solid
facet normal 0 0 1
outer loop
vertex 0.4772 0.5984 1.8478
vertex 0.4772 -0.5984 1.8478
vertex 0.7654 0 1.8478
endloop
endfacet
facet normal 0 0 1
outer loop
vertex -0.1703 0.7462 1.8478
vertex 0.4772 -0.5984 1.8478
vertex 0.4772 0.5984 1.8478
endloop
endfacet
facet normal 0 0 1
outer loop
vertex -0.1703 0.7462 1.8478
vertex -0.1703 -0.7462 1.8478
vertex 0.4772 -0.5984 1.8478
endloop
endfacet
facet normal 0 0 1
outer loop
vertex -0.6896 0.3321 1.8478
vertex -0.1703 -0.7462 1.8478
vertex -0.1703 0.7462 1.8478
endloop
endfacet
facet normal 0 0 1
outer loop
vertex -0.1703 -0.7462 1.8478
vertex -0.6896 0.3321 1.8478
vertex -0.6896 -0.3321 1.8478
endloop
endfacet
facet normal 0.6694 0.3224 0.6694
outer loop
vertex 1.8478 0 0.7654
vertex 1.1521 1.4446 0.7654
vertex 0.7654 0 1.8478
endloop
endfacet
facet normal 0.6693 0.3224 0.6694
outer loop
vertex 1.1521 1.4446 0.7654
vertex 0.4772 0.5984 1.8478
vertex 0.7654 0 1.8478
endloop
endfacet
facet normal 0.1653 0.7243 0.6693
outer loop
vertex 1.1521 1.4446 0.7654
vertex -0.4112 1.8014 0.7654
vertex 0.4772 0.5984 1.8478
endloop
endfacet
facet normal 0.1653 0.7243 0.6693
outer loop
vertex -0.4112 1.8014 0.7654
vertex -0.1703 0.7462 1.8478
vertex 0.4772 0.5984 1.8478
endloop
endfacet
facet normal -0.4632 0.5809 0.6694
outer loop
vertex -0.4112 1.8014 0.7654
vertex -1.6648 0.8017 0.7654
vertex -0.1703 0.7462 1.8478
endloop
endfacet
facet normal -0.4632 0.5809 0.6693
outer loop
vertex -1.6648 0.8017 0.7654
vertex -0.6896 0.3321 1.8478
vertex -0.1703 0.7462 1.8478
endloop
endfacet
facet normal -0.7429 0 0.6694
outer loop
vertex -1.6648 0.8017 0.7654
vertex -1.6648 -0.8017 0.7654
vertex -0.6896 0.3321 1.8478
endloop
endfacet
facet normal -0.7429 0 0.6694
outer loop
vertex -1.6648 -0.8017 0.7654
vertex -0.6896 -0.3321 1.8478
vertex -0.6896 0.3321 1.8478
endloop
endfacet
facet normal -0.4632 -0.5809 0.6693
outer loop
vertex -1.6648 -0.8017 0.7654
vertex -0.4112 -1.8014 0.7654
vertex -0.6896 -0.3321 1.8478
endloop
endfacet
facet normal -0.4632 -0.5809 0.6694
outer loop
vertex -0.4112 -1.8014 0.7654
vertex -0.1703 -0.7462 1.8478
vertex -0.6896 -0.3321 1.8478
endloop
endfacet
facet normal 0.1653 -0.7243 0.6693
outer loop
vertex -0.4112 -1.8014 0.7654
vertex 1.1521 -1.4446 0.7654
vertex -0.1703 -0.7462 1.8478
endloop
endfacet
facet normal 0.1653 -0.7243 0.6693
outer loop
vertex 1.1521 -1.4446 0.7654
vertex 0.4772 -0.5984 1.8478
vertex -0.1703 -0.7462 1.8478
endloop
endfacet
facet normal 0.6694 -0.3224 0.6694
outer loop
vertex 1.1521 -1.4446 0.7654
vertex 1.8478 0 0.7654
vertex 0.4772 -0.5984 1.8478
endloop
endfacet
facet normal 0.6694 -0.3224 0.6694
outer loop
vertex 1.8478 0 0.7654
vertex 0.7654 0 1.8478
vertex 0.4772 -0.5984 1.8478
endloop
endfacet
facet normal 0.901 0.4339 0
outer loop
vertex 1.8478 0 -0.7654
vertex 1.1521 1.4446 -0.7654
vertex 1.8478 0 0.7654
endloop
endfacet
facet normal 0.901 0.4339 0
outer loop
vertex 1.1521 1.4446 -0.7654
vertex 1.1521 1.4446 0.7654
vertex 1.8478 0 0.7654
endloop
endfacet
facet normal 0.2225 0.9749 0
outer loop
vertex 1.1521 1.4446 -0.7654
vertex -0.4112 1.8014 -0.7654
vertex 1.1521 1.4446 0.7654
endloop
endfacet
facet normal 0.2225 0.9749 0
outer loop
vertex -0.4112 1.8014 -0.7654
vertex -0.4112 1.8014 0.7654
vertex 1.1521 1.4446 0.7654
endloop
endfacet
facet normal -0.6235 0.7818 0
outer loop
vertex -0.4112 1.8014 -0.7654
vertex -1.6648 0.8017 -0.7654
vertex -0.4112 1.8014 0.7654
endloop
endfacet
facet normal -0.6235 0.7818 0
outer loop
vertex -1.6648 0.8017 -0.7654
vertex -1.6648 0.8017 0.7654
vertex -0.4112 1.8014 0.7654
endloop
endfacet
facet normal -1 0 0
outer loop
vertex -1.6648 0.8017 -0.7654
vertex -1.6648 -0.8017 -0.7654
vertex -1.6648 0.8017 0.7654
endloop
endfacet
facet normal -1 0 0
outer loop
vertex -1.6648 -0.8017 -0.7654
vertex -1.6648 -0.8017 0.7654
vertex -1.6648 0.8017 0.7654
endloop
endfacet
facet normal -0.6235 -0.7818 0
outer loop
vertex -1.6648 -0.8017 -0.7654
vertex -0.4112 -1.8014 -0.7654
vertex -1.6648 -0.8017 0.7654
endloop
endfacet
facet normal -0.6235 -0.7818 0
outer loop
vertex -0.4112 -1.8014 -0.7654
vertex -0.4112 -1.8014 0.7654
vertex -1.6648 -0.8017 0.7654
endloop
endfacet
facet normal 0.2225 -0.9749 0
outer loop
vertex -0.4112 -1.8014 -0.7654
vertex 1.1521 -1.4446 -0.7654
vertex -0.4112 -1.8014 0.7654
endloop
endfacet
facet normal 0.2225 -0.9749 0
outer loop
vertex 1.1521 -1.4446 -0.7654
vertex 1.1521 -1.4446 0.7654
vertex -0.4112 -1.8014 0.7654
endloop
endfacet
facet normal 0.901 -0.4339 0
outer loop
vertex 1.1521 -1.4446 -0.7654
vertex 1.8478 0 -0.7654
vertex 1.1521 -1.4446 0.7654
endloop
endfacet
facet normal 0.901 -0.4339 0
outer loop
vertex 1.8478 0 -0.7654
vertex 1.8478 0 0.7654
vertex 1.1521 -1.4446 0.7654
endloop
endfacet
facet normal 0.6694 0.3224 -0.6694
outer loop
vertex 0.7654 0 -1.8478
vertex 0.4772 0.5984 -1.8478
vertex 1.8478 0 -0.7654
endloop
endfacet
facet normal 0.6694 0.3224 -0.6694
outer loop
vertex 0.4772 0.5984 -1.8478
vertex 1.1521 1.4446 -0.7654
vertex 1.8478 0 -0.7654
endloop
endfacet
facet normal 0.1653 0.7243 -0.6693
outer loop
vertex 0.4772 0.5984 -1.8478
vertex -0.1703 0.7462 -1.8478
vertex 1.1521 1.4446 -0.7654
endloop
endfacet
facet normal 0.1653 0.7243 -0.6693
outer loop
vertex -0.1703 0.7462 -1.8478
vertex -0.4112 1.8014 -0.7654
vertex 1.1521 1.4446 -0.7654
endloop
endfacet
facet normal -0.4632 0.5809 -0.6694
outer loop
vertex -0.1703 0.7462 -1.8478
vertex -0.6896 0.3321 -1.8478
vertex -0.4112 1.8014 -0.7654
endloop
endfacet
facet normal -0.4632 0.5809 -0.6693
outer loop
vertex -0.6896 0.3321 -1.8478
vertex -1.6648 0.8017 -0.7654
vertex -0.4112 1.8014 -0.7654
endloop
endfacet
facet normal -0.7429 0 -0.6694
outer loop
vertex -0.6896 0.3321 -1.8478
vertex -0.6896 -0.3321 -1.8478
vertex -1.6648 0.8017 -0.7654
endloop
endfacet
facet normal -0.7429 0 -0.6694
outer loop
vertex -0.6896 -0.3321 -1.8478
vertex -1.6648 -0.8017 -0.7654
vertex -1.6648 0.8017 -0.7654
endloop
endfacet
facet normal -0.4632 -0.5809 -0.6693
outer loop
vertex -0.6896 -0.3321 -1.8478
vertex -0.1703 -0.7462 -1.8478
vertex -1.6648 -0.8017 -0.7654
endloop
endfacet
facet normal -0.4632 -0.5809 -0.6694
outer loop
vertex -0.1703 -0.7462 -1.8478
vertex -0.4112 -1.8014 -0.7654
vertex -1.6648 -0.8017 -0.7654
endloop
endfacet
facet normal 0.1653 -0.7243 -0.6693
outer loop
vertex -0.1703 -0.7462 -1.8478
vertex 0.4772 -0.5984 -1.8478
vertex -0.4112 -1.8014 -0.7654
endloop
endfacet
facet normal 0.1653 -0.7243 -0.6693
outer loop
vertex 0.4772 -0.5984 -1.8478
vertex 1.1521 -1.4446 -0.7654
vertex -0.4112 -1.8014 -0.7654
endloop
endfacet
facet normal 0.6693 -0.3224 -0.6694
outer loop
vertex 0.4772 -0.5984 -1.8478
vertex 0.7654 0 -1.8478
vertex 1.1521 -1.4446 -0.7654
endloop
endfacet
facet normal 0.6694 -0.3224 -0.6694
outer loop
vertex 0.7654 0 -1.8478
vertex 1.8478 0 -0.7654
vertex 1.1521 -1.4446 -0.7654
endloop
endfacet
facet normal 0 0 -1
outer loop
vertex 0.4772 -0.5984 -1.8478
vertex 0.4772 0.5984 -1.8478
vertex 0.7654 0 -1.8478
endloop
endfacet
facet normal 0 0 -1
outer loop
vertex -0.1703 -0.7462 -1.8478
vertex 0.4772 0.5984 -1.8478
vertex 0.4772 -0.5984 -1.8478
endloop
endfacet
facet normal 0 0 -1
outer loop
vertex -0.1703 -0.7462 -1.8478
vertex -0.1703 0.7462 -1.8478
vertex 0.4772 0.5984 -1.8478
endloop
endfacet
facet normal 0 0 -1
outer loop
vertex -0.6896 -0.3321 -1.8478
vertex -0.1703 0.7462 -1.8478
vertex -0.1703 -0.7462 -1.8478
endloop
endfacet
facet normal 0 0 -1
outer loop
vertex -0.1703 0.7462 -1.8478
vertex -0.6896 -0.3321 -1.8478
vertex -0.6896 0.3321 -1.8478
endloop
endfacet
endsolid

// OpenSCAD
/*
<json>
    {
        "Name": "Item 0",
        "Desc": "Desc 0",
        "LowKeyword": "Lost",
        "HighKeyword": "Printed",
        "varBase": "Var0",
        "minDefault": 1,
        "maxDefault": 2,
        "minDefaultND": "nozzleDiameter",
        "maxDefaultND": "2 * nozzleDiameter",
        "cameraData": "-2.28,2.59,6.06,59.9,0,13.8,113.4",
        "sortOrder": 0
    }
</json>
*/

sphere(d=4);

/*
<json>
    {
        "Name": "Item 1",
        "Desc": "Desc 1",
        "LowKeyword": "Lost",
        "HighKeyword": "Printed",
        "varBase": "Var1",
        "minDefault": 3,
        "maxDefault": 4,
        "minDefaultND": "3 * nozzleDiameter",
        "maxDefaultND": "4 * nozzleDiameter",
        "cameraData": "-2.28,2.59,6.06,59.9,0,13.8,113.4",
        "sortOrder": 0
    }
</json>
*/

/*
<json>
    {
        "Name": "Item 2",
        "Desc": "Desc 2",
        "LowKeyword": "Lost",
        "HighKeyword": "Printed",
        "varBase": "Var2",
        "minDefault": "layerHeight",
        "maxDefault": "2 * layerHeight",
        "minDefaultND": "5 * nozzleDiameter",
        "maxDefaultND": "6 * nozzleDiameter",
        "cameraData": "-2.28,2.59,6.06,59.9,0,13.8,113.4",
        "sortOrder": 0
    }
</json>
*/
